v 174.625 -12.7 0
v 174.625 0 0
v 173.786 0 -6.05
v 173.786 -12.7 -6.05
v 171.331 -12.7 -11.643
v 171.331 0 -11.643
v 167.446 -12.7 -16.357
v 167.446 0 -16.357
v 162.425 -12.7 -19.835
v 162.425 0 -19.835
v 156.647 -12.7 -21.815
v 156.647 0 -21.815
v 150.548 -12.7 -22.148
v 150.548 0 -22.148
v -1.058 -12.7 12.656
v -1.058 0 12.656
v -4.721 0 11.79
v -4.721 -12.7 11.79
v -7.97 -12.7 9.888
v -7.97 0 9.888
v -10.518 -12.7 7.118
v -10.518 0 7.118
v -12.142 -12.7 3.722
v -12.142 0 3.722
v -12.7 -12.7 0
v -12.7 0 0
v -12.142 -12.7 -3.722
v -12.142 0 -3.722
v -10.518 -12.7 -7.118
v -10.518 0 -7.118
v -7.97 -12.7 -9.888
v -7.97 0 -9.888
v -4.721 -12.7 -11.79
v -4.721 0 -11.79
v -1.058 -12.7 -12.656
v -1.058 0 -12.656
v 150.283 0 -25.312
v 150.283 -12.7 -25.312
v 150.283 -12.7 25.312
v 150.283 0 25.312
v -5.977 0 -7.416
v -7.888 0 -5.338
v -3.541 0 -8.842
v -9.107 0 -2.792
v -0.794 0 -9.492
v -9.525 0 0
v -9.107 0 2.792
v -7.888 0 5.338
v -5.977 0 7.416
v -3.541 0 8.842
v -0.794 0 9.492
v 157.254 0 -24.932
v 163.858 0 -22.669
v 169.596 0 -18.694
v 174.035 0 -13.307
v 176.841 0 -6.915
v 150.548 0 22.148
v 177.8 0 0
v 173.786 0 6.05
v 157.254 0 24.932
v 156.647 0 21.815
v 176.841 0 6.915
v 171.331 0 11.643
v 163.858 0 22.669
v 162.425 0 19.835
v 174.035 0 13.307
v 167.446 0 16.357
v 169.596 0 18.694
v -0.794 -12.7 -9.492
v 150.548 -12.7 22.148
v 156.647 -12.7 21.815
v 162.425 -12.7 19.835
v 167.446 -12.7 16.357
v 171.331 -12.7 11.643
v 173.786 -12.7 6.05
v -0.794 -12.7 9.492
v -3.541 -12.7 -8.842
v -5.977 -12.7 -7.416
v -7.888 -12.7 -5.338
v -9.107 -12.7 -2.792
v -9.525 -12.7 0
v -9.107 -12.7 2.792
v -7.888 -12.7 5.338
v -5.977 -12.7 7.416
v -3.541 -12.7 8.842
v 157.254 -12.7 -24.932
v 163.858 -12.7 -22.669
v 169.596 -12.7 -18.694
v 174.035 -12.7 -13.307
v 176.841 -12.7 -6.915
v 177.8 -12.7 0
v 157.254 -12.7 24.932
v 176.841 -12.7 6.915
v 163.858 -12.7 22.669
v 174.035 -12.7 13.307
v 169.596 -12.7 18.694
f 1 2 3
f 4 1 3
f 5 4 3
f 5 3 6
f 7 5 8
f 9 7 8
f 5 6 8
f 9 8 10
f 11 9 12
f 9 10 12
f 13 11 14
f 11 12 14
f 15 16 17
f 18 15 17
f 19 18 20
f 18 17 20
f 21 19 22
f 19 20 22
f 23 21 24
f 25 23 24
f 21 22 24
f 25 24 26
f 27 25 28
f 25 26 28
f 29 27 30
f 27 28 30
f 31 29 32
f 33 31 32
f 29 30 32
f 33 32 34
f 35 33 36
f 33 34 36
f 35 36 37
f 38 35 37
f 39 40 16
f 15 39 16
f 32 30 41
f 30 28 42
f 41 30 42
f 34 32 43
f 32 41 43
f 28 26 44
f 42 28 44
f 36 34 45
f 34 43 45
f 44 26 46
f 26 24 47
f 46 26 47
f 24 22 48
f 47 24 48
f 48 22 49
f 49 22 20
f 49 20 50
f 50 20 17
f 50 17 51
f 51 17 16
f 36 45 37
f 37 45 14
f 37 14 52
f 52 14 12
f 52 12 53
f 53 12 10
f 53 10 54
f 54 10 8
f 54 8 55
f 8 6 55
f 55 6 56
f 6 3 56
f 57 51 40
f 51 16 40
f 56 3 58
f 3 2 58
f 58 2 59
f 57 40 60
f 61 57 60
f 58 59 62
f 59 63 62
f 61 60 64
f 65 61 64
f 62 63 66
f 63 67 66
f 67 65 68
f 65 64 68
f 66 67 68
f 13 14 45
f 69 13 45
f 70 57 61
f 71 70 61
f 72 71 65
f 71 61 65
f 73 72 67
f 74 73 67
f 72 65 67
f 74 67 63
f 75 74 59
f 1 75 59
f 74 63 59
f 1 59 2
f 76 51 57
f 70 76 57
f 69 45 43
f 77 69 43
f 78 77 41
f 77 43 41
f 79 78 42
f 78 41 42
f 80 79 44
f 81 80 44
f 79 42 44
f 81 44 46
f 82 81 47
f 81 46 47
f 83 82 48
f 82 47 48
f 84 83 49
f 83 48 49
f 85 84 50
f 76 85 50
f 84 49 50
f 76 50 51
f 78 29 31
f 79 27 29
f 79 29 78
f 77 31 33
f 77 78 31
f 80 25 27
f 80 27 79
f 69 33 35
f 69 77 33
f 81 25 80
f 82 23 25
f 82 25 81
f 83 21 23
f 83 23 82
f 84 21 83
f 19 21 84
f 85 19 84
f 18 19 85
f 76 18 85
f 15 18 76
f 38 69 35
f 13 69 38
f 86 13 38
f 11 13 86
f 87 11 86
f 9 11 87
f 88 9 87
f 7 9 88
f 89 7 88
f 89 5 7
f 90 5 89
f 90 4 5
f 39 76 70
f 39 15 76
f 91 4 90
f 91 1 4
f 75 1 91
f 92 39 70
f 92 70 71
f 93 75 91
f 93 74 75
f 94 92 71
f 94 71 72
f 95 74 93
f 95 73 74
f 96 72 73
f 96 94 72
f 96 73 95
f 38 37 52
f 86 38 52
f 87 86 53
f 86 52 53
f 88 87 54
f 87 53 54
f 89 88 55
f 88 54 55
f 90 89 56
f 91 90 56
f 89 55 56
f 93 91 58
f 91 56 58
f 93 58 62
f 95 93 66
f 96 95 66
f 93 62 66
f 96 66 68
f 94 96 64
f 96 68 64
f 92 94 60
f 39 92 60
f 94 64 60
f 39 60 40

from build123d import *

# Parameters (mm, degrees)
F1_DEPTH = 12.7


with BuildPart() as f1:
    # F0 (on Front) → F1 (new body)
    with BuildSketch(Plane.XZ):
        with BuildLine():
            Line((150.283333, 25.311652), (-1.058333, 12.655826))
            ThreePointArc((-1.058333, 12.655826), (-12.7, 0), (-1.058333, -12.655826))
            Line((-1.058333, -12.655826), (150.283333, -25.311652))
            ThreePointArc((150.283333, -25.311652), (177.8, 0), (150.283333, 25.311652))
        make_face()
        with BuildLine():
            ThreePointArc((-0.79375, -9.491869), (-9.525, 0), (-0.79375, 9.491869))
            Line((-0.79375, 9.491869), (150.547917, 22.147695))
            ThreePointArc((150.547917, 22.147695), (167.446396, 16.357157), (174.625, 0))
            ThreePointArc((174.625, 0), (167.446396, -16.357157), (150.547917, -22.147695))
            Line((150.547917, -22.147695), (-0.79375, -9.491869))
        make_face(mode=Mode.SUBTRACT)
    extrude(amount=F1_DEPTH)


solid = f1.part
